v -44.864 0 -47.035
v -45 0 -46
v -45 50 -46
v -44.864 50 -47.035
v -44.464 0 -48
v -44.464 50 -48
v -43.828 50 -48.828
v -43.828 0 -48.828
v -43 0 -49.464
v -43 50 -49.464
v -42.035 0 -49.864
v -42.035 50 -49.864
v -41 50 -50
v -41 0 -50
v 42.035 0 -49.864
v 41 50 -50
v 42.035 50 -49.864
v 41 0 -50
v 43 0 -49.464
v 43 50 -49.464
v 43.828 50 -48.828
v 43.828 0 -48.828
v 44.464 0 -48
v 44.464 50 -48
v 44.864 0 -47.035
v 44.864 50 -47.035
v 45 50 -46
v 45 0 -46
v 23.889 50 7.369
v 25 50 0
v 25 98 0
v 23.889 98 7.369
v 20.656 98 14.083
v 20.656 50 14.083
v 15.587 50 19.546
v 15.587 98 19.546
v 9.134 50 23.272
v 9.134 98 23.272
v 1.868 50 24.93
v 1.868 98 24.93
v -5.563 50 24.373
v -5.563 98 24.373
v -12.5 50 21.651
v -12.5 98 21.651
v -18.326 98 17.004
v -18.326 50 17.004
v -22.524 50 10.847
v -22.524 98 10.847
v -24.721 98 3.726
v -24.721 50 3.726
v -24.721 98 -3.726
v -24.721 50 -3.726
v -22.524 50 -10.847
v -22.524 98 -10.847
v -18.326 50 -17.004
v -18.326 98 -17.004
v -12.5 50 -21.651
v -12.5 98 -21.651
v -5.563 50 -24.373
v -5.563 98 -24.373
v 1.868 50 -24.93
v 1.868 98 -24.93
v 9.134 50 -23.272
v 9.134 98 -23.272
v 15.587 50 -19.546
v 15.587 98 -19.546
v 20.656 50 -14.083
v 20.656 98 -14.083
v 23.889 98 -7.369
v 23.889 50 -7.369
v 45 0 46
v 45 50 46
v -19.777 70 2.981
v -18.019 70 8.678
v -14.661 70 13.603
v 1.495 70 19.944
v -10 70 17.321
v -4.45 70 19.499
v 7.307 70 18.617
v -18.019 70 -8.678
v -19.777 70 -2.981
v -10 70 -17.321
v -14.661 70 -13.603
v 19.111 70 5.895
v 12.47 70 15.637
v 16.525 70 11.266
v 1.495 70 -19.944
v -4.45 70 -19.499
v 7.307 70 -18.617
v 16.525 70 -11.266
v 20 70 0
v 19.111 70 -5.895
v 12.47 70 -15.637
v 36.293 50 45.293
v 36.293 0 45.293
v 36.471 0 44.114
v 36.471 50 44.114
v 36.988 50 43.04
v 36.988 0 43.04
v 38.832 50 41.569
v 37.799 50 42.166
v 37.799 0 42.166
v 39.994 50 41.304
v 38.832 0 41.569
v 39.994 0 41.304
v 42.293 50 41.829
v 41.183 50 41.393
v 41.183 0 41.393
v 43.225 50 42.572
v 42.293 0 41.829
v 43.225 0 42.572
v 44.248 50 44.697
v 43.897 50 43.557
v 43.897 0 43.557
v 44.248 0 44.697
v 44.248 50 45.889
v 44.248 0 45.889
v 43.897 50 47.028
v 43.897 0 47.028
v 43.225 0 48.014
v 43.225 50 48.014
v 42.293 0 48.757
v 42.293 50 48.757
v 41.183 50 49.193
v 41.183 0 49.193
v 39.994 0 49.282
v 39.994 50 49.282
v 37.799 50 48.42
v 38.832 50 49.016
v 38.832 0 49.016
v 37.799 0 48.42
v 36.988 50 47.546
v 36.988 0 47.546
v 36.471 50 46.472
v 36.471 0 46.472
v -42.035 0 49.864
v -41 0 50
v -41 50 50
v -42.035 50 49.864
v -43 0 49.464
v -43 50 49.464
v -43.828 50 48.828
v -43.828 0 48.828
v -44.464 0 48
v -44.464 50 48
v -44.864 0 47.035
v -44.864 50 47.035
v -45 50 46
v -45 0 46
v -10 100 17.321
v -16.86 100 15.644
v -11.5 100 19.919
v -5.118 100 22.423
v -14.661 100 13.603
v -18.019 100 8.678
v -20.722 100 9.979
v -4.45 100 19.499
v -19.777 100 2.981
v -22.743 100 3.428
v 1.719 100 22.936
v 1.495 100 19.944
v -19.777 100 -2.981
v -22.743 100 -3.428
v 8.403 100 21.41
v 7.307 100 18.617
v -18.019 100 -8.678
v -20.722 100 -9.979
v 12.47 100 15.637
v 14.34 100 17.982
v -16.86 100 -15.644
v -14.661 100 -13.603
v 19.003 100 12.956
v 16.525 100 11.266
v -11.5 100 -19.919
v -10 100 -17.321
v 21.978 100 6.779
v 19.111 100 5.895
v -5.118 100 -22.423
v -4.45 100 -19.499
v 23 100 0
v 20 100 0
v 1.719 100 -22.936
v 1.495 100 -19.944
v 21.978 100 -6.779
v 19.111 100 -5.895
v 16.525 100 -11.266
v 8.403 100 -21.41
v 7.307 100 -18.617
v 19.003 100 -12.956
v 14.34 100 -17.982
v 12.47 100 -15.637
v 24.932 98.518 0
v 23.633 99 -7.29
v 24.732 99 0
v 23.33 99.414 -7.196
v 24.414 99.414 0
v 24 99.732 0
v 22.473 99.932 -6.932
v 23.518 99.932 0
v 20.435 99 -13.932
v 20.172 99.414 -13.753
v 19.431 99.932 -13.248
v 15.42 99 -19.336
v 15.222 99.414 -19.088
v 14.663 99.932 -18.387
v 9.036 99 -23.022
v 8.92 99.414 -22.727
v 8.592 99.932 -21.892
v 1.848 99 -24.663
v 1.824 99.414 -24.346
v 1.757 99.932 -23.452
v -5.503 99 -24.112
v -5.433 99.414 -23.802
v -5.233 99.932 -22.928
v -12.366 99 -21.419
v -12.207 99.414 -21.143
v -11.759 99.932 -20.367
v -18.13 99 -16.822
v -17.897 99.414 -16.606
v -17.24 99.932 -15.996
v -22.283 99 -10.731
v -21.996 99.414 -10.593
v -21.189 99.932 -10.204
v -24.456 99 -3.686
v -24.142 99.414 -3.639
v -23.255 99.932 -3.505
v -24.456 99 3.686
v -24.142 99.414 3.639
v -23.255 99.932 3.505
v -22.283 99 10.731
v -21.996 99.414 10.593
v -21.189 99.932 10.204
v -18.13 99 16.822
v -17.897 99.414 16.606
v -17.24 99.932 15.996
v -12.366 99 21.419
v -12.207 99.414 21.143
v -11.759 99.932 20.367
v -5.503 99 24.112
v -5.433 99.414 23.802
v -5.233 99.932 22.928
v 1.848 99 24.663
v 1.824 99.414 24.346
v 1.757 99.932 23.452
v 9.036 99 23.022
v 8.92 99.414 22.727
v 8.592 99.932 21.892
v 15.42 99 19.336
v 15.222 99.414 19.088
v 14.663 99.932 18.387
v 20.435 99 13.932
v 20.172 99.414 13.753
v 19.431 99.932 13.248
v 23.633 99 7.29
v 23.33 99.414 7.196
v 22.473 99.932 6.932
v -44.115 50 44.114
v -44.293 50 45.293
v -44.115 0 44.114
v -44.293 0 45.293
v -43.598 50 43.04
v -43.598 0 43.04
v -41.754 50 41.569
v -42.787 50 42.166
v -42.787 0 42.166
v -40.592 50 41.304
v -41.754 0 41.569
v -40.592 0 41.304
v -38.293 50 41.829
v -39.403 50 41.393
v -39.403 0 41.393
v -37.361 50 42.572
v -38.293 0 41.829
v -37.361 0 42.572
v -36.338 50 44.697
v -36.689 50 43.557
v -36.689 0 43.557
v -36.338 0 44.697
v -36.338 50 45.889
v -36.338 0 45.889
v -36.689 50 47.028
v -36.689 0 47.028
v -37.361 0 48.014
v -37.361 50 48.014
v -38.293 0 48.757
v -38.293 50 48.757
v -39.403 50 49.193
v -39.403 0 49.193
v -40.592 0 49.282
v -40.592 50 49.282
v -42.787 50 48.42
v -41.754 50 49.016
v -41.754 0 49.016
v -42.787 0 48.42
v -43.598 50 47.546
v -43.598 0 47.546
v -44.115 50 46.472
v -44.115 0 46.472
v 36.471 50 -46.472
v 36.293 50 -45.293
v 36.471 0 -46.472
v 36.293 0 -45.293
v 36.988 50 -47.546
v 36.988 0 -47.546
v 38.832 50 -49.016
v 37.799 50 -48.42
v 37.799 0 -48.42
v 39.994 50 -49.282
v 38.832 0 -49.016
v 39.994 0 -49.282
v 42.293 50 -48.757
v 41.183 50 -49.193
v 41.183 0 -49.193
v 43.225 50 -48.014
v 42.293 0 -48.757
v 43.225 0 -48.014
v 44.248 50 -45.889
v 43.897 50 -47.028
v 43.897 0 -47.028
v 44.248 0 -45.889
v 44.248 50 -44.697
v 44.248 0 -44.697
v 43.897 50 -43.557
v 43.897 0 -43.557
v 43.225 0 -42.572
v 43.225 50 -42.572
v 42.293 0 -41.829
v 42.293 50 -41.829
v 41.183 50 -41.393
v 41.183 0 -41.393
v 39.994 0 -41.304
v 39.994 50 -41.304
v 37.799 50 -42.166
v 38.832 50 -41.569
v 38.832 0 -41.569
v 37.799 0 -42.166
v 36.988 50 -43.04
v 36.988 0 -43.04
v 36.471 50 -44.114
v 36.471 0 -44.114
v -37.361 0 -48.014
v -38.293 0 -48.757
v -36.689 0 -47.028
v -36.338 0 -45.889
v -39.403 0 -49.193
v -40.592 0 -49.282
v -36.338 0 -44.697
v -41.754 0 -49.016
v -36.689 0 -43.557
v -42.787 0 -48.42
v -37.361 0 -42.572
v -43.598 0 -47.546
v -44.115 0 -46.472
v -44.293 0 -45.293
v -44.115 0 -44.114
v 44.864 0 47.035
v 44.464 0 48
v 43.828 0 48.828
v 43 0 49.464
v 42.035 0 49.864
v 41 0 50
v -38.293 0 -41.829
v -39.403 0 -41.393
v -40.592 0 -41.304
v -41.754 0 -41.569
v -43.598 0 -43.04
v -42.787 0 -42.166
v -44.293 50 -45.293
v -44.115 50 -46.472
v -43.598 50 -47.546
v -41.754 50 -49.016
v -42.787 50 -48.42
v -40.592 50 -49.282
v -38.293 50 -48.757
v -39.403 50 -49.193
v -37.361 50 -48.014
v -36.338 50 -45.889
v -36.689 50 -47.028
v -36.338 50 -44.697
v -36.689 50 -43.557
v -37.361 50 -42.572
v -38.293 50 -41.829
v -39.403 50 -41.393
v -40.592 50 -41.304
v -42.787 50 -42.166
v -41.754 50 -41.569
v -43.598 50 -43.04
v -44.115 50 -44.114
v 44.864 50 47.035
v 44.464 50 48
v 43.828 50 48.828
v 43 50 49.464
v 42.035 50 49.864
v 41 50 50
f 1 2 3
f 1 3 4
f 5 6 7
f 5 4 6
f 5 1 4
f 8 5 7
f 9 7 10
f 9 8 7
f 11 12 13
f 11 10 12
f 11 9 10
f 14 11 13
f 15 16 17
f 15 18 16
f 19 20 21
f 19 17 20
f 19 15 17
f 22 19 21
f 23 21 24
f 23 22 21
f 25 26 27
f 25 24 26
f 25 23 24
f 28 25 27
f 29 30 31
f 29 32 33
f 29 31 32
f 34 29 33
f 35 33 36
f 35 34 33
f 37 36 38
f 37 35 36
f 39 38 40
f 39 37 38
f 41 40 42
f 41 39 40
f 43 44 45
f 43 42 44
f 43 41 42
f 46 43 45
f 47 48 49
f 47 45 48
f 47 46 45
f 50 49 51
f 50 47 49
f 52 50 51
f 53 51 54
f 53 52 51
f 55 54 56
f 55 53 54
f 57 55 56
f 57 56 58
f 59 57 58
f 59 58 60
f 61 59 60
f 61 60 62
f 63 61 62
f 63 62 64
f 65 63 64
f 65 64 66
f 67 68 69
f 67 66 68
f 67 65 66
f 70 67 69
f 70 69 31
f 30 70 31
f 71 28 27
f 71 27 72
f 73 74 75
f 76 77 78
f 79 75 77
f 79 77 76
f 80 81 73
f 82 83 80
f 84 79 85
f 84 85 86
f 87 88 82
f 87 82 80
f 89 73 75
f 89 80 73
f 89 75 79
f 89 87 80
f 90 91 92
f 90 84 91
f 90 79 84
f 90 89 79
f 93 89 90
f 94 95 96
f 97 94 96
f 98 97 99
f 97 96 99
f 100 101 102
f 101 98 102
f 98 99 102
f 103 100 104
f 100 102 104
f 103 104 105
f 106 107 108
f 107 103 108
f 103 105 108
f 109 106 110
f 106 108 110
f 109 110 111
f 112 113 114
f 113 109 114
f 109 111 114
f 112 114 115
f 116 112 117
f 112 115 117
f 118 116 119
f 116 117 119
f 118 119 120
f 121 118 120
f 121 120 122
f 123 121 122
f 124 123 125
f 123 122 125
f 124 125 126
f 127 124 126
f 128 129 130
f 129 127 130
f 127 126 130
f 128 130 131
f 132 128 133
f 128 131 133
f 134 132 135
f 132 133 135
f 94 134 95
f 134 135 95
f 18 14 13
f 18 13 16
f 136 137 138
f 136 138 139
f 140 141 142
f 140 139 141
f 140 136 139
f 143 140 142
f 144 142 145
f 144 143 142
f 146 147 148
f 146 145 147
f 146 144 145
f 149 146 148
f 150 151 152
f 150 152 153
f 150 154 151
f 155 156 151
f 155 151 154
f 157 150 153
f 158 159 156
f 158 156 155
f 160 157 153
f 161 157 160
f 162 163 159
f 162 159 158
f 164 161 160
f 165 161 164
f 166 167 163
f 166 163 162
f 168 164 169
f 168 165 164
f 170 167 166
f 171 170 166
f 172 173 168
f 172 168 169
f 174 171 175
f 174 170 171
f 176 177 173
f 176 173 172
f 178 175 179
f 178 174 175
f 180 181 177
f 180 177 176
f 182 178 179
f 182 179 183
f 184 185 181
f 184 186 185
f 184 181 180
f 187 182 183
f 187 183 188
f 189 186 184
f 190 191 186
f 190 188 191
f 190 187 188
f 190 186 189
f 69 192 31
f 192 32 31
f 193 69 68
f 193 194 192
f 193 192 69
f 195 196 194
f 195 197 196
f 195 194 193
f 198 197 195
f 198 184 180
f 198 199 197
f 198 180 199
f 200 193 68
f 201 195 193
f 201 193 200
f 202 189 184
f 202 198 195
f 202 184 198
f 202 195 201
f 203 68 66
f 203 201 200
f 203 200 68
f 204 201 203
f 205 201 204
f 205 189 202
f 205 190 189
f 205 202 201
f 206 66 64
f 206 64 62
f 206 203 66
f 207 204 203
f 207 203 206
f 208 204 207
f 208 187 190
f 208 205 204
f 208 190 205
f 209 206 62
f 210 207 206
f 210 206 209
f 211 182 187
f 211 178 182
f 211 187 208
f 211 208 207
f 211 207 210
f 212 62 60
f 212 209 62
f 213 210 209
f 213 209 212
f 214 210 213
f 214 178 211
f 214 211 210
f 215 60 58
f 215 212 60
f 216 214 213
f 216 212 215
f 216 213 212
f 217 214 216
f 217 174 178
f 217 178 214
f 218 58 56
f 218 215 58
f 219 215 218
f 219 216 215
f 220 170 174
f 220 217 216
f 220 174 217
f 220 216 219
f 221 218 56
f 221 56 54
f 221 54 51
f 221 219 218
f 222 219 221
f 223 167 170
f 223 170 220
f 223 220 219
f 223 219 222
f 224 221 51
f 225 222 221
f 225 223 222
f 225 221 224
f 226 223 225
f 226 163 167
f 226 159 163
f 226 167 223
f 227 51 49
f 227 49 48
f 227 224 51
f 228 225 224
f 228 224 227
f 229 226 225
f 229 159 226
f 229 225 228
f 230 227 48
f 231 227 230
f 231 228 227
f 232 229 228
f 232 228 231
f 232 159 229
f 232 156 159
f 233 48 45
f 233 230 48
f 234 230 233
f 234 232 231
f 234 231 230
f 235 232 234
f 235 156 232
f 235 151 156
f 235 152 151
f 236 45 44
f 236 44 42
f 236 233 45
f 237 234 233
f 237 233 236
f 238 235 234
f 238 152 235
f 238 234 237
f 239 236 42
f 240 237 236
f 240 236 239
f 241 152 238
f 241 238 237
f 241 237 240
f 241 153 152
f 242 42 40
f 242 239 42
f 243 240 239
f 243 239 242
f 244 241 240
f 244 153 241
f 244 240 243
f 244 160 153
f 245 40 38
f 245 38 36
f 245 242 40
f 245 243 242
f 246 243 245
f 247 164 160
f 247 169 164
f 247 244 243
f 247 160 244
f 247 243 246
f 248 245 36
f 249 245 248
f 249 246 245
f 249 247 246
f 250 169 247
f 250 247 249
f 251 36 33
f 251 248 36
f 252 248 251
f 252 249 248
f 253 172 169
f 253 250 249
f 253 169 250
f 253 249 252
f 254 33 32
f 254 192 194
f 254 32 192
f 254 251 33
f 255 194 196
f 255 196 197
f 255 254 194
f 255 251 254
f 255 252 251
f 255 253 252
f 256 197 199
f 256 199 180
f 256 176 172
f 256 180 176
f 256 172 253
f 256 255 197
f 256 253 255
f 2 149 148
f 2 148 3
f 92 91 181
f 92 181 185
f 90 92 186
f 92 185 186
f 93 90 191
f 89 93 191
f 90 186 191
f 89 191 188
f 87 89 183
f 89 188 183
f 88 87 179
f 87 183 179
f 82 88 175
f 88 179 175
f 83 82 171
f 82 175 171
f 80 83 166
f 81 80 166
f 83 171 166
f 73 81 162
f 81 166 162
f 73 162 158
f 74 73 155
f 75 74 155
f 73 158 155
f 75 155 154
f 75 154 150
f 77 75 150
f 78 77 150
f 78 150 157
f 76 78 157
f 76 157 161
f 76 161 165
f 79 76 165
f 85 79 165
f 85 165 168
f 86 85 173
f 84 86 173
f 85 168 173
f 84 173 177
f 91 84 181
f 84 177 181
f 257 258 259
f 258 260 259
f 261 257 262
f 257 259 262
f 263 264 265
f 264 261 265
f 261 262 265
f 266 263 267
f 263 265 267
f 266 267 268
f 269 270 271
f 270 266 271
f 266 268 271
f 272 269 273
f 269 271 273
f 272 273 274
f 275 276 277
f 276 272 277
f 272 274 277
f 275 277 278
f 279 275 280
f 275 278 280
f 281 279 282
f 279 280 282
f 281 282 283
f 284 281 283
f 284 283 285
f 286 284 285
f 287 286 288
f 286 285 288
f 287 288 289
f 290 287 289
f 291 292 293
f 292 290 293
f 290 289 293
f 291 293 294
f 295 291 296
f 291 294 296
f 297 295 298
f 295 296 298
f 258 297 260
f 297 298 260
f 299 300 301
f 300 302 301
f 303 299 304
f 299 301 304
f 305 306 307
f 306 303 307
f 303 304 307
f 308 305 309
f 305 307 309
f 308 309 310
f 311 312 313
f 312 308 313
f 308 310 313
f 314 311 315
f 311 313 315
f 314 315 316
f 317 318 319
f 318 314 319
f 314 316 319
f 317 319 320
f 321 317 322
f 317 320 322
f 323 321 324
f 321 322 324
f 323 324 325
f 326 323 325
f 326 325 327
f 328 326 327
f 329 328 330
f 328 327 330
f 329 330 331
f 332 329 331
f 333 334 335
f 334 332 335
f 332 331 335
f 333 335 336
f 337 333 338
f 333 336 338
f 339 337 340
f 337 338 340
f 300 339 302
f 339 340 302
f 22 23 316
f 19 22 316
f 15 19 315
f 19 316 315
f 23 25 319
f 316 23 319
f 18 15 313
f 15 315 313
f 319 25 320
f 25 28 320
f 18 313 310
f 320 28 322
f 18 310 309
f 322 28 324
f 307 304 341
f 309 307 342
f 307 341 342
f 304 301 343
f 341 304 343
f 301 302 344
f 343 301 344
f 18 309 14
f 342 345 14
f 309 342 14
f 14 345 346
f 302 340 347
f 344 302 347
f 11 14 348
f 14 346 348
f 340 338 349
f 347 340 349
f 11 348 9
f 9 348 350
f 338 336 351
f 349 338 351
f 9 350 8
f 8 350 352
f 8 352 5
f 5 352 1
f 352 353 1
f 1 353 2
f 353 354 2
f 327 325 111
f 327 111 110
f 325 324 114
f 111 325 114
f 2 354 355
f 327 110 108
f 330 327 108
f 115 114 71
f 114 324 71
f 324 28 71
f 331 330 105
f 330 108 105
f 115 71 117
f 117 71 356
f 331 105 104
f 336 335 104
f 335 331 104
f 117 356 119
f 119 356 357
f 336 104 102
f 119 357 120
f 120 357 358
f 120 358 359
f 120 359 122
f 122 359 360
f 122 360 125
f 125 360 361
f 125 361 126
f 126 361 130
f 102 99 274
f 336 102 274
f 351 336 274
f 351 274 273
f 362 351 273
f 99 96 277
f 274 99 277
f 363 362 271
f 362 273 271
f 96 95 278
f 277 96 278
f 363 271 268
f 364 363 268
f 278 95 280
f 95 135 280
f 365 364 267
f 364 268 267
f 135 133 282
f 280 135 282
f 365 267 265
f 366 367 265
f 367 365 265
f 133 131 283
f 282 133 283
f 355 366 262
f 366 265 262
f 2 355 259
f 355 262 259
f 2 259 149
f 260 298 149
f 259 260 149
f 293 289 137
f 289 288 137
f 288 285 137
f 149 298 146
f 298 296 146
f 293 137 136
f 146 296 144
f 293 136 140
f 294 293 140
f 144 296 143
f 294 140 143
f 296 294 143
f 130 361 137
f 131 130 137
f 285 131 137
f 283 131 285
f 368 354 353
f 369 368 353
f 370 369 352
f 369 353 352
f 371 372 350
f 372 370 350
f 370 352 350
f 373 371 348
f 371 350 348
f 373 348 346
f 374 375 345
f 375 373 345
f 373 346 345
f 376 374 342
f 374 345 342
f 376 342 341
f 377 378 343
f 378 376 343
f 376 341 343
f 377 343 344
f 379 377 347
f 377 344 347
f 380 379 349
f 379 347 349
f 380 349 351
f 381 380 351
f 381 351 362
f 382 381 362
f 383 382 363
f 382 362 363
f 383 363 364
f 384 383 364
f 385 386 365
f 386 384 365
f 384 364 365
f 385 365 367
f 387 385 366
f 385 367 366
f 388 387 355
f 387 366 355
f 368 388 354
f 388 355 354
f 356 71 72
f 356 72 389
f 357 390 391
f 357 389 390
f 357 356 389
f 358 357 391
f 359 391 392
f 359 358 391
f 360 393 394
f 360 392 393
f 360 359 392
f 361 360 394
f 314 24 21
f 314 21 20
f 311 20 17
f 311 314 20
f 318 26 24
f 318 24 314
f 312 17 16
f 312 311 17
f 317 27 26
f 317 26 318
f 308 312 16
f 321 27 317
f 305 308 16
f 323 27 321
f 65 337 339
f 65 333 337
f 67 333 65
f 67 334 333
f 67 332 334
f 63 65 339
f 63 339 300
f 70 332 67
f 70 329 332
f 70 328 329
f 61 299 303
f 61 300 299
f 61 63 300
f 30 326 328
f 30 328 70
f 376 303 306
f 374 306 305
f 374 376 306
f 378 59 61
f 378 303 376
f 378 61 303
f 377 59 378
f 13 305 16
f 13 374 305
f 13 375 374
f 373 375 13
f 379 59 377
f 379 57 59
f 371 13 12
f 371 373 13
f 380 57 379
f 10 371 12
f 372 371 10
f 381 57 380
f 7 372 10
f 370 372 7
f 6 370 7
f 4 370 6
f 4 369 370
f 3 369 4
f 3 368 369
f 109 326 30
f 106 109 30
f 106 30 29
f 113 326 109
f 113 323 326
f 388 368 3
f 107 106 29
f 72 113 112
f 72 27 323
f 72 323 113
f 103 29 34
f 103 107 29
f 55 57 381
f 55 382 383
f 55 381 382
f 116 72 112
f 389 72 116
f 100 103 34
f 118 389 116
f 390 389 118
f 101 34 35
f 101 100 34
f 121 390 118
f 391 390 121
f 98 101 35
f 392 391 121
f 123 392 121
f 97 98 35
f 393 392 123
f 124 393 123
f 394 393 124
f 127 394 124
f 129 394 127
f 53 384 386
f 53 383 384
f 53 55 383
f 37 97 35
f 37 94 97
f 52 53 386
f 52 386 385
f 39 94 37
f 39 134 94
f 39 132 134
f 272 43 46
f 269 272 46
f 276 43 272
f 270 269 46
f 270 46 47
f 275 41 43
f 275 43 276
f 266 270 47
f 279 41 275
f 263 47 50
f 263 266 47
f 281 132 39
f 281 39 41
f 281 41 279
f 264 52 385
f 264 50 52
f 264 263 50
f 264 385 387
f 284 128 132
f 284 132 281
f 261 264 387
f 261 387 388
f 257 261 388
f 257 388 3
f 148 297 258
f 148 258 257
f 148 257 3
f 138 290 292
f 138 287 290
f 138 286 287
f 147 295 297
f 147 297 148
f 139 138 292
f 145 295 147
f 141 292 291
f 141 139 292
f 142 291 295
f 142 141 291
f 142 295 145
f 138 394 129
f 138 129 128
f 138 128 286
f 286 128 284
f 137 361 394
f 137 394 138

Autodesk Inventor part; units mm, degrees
ref_plane "YZ Plane" through (0, 0, 0) normal (1, 0, 0) x (0, 1, 0)
ref_plane "XZ Plane" through (0, 0, 0) normal (0, 1, 0) x (-1, 0, 0)
ref_plane "XY Plane" through (0, 0, 0) normal (0, 0, 1) x (1, 0, 0)
sketch "Boceto1" plane through (0, 0, 0) normal (0, 1, 0) x (-1, 0, 0)
  line L0 (-41, 50) -> (41, 50)
  line L1 (45, 46) -> (45, -46)
  line L2 (41, -50) -> (-41, -50)
  line L3 (-45, -46) -> (-45, 46)
  arc A0 (41, -50) -> (45, -46) centre (41, -46) ccw
  arc A1 (45, 46) -> (41, 50) centre (41, 46) ccw
  arc A2 (-41, 50) -> (-45, 46) centre (-41, 46) ccw
  arc A3 (-45, -46) -> (-41, -50) centre (-41, -46) ccw
  line L4 (43.8284, -48.8284) -> (48.8284, -48.8284) construction
  circle A4 centre (40.2929, -45.2929) radius 4
  circle A5 centre (40.2929, 45.2929) radius 4
  circle A6 centre (-40.2929, 45.2929) radius 4
  circle A7 centre (-40.2929, -45.2929) radius 4
  point P0 (0, 0)
extrude "Extrusión1" add sketch "Boceto1" along normal blind 50
sketch "Boceto2" plane through (0, 50, 0) normal (0, 1, 0) x (1, 0, 0)
  circle A0 centre (0, 0) radius 25
  dimension "d19" = 50
extrude "Extrusión2" add sketch "Boceto2" along normal blind 50
sketch "Boceto3" plane through (0, 100, 0) normal (0, 1, 0) x (1, 0, 0)
  circle A0 centre (0, 0) radius 20
  dimension "d22" = 40
extrude "Extrusión3" cut sketch "Boceto3" against normal blind 30
thread "Rosca1" size "M50x4" class "6H" standard "ANSI Metric M Profile" full length
fillet "Empalme1" radius 2 1 edges at (-25, 100, 0)
properties part number "Pieza No.1 Lj"
